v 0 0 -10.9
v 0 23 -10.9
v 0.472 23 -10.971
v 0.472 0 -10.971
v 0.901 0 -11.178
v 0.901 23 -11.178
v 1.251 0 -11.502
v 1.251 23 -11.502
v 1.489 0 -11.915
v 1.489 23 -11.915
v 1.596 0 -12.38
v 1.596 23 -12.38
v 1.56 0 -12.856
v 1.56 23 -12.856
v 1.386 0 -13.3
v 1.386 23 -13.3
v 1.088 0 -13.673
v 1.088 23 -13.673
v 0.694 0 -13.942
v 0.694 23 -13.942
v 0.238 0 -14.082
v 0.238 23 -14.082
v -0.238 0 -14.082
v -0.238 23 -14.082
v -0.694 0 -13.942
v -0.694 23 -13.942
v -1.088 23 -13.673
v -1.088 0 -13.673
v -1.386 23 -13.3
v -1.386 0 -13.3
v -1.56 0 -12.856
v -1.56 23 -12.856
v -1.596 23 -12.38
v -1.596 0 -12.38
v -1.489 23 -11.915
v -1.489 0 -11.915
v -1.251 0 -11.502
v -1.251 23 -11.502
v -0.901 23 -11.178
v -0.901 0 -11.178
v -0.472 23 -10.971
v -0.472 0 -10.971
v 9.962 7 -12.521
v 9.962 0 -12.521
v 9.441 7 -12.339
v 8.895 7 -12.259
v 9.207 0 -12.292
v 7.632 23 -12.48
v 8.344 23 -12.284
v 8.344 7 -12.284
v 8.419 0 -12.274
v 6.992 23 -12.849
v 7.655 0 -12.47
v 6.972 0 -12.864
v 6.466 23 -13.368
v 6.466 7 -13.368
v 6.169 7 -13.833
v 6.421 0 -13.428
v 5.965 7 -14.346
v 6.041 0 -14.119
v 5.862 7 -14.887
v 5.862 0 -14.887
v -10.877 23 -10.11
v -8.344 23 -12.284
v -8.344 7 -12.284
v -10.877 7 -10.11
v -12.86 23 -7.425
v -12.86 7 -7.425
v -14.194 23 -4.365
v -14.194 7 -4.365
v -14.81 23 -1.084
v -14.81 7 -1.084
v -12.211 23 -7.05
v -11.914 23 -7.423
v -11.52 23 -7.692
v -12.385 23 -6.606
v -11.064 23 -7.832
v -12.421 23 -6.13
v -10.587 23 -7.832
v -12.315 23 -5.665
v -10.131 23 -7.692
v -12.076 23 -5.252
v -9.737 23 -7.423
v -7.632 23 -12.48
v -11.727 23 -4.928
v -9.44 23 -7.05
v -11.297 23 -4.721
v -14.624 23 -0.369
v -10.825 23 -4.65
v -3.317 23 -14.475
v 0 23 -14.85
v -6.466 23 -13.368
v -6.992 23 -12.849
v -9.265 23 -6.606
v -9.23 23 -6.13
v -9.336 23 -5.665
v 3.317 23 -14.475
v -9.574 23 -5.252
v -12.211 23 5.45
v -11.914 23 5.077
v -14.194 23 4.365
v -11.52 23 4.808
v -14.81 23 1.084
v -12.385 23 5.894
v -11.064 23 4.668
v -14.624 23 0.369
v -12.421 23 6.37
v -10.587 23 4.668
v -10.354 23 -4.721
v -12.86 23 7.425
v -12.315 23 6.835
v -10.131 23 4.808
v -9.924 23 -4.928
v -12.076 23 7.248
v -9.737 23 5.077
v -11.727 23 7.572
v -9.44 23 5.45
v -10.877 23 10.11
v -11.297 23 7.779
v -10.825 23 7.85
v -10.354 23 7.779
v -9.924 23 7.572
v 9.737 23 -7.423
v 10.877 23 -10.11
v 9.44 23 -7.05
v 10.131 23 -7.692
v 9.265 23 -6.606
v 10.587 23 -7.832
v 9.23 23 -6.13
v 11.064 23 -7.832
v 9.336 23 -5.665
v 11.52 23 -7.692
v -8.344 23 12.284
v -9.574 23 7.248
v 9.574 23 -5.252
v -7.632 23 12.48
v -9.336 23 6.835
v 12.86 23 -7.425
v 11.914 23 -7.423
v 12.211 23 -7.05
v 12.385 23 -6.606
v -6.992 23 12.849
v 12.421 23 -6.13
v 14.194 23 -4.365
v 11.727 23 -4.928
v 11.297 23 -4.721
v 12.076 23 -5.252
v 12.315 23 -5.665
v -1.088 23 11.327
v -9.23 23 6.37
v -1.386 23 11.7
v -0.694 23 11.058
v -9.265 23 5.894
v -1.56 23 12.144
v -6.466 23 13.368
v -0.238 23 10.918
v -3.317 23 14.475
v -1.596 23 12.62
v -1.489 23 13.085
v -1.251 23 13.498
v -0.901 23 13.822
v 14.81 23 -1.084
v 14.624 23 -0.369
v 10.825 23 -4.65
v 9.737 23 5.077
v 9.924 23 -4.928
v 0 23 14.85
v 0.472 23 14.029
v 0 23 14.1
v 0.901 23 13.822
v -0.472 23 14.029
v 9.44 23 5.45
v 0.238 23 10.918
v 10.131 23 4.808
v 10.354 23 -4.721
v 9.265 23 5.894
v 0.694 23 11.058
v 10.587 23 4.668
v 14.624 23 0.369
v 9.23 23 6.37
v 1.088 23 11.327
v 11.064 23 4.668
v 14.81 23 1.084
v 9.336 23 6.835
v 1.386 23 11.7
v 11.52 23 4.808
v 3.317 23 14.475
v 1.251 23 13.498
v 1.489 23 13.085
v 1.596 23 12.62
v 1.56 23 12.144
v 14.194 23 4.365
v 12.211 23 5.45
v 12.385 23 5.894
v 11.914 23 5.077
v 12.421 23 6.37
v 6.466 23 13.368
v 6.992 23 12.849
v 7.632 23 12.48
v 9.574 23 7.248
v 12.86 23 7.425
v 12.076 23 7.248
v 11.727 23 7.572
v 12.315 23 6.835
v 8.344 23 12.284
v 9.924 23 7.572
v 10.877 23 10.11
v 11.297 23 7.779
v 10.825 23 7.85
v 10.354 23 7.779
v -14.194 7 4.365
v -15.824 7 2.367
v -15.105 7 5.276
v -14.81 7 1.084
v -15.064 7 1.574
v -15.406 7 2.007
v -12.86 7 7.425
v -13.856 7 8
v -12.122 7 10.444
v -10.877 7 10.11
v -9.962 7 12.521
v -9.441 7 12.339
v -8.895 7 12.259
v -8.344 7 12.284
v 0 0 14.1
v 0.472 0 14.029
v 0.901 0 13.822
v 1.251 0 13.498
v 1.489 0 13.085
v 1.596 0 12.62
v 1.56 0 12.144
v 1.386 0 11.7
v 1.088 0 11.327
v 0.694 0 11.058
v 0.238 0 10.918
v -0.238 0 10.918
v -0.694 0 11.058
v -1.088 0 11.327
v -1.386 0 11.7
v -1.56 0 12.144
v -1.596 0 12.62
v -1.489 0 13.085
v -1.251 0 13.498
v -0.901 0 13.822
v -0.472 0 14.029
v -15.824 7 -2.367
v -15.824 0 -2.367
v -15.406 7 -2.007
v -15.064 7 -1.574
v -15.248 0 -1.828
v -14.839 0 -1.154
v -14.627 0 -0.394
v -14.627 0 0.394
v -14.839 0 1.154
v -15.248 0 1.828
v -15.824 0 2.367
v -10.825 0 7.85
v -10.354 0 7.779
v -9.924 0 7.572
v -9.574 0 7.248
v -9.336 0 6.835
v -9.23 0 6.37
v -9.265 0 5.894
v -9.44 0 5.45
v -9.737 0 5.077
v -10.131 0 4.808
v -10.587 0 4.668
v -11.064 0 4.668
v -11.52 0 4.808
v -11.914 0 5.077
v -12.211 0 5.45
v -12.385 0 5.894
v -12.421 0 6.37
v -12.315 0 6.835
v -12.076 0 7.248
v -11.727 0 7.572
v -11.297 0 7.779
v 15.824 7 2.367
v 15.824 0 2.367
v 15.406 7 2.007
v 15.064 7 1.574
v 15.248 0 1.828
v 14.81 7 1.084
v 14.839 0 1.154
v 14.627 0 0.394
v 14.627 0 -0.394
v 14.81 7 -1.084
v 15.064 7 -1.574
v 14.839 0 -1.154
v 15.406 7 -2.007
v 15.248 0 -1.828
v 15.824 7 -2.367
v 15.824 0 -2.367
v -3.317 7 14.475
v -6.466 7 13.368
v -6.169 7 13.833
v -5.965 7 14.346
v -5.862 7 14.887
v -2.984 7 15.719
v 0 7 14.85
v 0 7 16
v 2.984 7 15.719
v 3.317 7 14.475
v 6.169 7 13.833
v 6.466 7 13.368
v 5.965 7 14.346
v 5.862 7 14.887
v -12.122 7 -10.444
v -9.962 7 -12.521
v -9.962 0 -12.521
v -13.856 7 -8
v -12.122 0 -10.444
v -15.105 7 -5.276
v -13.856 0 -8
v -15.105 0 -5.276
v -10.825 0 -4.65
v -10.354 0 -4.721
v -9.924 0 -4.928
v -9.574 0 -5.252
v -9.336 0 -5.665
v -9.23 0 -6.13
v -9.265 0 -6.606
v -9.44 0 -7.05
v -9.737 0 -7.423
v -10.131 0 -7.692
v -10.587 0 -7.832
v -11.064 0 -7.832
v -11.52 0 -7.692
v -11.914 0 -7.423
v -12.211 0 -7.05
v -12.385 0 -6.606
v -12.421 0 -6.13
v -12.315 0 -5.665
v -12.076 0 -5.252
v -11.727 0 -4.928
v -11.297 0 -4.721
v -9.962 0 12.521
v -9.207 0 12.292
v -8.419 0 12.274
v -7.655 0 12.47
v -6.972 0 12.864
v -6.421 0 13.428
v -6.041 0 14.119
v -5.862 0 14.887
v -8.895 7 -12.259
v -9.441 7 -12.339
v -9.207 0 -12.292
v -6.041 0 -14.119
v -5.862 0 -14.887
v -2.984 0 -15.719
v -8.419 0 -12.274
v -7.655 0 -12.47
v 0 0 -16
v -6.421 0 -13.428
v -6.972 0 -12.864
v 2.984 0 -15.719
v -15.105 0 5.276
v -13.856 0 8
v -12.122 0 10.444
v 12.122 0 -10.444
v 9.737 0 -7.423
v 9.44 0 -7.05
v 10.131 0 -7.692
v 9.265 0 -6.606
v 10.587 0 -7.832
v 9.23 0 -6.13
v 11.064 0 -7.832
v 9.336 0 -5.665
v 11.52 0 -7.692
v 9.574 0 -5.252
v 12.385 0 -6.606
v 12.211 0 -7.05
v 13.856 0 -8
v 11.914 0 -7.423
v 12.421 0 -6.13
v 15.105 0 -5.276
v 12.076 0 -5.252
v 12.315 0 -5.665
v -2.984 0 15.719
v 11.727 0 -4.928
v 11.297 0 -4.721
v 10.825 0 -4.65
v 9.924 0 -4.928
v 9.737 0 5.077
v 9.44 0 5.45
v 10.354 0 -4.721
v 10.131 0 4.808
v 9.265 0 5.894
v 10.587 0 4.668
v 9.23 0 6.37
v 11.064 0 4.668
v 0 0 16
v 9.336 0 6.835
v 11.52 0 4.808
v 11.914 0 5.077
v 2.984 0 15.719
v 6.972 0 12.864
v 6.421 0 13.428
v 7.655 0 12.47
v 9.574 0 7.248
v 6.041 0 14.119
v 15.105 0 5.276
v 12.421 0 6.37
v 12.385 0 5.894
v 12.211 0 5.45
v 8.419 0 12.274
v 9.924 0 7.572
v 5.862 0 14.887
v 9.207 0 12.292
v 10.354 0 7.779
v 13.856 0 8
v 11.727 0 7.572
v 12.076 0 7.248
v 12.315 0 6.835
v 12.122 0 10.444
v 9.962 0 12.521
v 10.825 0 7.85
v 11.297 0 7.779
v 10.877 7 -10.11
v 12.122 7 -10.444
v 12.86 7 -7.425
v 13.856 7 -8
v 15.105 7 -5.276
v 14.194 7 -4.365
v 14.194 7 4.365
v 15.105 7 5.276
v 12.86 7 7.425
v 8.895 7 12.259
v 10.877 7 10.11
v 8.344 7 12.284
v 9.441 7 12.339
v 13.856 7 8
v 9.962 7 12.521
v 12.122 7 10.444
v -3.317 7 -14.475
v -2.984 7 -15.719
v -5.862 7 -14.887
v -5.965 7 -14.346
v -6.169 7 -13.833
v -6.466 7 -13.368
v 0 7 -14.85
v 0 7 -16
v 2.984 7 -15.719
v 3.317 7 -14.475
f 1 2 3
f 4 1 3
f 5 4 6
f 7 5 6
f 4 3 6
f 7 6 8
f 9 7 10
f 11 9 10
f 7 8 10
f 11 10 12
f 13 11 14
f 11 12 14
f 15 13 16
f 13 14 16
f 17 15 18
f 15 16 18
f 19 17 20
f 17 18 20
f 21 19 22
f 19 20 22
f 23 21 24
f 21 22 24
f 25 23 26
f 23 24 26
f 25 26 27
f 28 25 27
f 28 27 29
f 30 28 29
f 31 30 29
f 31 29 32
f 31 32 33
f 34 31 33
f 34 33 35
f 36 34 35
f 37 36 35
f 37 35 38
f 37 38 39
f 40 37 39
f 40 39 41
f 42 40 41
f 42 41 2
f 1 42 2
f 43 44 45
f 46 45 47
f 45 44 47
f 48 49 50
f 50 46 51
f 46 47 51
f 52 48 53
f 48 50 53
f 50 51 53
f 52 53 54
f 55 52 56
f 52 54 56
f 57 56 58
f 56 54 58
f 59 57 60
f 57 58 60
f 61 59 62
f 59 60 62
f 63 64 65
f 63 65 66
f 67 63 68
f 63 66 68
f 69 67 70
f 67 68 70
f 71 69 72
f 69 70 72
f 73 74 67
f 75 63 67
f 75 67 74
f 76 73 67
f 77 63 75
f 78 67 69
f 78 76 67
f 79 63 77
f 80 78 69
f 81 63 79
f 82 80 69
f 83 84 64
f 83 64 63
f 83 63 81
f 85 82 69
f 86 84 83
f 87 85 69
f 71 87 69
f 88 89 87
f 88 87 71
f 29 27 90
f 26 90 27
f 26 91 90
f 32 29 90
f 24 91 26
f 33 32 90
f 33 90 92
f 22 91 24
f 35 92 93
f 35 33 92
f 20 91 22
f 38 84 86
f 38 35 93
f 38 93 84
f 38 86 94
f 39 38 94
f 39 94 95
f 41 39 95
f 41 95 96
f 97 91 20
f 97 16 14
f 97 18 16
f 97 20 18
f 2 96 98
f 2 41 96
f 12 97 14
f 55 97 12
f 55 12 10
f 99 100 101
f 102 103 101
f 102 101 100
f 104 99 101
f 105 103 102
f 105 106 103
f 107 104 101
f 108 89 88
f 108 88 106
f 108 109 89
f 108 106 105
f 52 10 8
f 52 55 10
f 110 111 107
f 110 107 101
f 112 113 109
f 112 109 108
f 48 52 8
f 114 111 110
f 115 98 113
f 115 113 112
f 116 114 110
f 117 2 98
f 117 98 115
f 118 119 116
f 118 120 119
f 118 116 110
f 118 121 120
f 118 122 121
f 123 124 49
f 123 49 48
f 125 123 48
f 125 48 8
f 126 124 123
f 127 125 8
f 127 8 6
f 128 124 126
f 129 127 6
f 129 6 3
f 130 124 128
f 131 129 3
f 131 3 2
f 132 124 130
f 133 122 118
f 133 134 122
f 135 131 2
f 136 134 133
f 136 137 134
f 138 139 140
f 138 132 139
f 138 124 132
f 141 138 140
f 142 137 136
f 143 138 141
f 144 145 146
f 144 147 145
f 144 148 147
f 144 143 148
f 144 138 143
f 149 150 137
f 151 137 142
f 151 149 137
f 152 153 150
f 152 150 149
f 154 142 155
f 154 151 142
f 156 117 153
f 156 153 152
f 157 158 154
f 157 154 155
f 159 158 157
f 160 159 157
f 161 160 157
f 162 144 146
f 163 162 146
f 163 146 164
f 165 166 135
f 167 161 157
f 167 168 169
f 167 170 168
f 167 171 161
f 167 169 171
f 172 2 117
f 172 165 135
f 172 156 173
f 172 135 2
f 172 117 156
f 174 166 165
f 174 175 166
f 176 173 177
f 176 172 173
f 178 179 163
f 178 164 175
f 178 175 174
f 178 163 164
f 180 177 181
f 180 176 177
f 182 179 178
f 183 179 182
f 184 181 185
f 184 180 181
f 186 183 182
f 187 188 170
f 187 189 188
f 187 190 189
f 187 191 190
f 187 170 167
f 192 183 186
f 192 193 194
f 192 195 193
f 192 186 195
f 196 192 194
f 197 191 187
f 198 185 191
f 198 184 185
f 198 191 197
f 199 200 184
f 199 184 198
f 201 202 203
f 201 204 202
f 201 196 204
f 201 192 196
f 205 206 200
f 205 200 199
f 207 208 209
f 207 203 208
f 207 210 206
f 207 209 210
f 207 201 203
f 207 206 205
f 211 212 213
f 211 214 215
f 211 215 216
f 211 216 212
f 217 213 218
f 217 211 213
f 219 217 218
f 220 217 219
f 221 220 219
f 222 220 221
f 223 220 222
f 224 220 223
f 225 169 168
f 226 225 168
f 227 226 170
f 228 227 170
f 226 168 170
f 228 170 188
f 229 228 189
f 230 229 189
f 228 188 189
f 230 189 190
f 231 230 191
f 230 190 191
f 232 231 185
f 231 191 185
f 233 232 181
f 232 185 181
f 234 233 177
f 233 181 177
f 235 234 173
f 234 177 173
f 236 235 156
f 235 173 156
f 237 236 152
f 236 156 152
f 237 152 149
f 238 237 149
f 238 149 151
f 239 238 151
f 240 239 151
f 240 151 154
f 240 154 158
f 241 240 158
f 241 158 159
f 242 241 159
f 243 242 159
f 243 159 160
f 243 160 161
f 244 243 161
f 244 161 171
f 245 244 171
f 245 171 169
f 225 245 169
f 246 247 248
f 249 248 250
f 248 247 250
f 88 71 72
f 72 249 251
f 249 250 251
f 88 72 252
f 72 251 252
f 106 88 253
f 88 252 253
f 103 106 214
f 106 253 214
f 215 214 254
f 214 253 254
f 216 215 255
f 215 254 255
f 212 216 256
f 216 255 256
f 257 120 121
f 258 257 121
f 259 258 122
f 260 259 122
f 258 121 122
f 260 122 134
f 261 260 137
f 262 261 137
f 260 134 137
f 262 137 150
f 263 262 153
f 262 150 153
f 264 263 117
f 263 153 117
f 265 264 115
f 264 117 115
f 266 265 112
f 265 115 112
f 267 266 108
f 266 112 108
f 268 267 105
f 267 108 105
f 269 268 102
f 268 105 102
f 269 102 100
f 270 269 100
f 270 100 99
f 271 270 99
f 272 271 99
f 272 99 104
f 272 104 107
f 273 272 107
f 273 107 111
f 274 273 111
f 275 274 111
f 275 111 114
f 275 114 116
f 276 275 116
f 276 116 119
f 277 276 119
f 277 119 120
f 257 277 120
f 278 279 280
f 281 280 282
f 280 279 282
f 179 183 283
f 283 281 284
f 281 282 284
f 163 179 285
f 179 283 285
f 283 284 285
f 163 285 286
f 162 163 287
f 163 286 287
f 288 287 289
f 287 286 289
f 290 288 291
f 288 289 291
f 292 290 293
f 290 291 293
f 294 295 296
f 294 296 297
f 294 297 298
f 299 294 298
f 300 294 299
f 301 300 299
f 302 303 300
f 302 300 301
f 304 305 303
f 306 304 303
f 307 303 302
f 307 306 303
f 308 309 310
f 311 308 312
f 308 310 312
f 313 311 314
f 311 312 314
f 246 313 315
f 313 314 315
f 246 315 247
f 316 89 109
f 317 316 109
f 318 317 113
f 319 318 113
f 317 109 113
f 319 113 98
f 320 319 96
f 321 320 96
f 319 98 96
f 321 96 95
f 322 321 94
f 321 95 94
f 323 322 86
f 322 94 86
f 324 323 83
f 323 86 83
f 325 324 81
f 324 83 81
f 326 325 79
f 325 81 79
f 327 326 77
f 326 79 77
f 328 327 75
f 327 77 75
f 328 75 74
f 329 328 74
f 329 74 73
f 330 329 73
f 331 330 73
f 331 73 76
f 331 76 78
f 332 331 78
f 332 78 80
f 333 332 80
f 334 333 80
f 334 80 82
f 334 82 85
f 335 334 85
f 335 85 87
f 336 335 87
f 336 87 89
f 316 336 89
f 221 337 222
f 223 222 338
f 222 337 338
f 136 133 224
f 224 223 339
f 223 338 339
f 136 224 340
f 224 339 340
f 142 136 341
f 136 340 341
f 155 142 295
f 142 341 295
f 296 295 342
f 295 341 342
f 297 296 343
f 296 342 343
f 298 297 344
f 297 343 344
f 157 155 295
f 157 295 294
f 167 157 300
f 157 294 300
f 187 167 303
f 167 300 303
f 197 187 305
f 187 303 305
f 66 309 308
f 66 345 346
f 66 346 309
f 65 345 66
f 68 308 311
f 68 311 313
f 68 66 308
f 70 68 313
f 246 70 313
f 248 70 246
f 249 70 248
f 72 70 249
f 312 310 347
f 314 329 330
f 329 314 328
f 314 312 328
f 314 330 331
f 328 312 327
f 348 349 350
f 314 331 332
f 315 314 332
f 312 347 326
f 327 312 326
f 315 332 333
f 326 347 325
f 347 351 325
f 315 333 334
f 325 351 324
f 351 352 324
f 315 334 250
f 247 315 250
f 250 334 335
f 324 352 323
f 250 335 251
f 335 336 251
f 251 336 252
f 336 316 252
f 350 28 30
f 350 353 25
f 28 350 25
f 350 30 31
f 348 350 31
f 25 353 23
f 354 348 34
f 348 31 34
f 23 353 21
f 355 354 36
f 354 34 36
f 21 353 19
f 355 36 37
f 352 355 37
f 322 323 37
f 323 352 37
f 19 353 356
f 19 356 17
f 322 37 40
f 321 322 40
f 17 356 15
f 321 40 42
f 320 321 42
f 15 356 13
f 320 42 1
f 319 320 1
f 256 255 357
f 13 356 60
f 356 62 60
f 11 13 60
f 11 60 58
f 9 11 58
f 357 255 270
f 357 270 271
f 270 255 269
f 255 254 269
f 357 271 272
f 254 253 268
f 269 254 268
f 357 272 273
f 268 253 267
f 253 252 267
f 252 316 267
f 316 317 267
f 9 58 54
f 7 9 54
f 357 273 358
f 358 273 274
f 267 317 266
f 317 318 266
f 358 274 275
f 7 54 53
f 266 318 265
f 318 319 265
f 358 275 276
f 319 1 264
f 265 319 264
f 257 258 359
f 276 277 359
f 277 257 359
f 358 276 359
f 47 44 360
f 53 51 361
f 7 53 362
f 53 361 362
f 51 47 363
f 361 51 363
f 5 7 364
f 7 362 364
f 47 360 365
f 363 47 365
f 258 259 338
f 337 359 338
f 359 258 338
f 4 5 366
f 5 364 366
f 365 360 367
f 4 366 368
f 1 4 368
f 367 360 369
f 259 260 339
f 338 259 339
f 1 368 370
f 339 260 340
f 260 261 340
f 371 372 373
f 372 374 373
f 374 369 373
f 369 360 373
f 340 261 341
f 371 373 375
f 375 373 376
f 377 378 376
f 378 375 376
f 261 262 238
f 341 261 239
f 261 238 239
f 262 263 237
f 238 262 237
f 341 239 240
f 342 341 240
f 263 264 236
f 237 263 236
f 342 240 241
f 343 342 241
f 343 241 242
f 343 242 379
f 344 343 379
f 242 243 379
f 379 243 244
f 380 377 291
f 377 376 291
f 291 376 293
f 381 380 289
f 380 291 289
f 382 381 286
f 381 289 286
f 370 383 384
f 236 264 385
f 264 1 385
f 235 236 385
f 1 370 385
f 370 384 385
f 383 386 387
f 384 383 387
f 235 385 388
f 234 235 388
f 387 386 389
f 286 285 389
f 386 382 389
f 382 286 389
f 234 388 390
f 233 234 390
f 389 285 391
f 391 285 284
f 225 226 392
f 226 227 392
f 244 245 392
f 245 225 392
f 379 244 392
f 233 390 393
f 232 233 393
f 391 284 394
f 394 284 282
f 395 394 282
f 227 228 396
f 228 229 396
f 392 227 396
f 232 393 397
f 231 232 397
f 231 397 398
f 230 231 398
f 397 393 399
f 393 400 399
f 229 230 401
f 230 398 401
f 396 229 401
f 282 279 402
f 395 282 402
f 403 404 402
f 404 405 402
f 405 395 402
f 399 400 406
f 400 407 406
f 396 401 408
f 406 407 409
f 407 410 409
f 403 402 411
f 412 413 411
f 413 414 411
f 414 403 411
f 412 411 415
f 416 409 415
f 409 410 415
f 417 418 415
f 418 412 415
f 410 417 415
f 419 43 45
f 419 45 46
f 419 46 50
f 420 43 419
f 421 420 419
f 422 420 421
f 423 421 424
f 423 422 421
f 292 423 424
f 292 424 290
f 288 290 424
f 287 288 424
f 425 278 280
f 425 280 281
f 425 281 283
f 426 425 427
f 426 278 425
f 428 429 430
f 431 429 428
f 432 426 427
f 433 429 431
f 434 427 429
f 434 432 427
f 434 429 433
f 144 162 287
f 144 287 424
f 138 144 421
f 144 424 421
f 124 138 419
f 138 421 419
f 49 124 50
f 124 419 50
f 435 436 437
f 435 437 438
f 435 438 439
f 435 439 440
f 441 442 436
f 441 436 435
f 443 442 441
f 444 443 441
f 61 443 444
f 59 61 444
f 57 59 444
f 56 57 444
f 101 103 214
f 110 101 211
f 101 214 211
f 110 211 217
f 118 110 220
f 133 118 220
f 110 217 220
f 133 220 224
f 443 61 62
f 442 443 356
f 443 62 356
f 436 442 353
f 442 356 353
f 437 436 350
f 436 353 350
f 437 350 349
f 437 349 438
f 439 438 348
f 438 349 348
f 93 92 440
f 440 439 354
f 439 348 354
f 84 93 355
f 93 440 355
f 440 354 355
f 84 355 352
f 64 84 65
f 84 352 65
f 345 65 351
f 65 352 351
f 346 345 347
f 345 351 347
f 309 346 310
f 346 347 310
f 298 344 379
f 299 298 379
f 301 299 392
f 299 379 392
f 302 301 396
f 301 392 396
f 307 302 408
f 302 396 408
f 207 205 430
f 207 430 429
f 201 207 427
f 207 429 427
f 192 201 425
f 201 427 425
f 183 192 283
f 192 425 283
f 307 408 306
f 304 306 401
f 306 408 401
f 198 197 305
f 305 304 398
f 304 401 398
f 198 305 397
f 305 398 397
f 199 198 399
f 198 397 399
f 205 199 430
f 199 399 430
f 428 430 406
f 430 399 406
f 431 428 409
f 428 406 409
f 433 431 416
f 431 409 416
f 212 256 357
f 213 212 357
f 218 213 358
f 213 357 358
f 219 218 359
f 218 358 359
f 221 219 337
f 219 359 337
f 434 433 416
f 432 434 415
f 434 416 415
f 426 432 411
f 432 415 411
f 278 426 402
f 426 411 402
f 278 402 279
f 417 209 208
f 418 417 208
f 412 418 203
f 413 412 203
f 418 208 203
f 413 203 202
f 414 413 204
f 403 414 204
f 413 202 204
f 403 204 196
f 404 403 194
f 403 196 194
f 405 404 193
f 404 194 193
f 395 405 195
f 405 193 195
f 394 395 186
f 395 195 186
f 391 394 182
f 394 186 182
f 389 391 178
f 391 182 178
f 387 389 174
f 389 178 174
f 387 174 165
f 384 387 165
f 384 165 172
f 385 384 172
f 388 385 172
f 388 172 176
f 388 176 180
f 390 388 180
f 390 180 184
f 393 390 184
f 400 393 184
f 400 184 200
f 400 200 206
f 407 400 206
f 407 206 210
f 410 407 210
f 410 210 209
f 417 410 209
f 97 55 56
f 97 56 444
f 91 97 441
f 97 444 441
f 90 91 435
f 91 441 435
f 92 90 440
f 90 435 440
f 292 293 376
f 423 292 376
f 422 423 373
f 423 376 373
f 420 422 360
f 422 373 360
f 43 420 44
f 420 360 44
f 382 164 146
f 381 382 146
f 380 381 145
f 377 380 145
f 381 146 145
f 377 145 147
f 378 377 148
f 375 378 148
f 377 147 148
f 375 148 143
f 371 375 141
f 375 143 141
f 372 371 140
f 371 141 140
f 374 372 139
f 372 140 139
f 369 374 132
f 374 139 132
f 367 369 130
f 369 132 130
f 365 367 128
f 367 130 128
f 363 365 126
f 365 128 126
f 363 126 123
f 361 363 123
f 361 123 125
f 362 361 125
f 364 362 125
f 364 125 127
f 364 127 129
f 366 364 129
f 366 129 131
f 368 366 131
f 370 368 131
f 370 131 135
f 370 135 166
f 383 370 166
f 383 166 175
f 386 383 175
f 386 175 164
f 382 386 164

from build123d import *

# Parameters (mm, degrees)
SKETCH_1_R          = 16
EXTRUDE_1_DEPTH     = 7
SKETCH_2_R          = 14.85
EXTRUDE_2_DEPTH     = 16
SKETCH_3_R          = 1.6
CUT_EXTRUDE_1_DEPTH = 33.26453161
SKETCH_4_R          = 2.9
CUT_EXTRUDE_2_DEPTH = 33.26453161


with BuildPart() as part:
    # 草图1 → 凸台-拉伸1 (new body)
    with BuildSketch(Plane(origin=(0, 0, 0), x_dir=(1, 0, 0), z_dir=(0, 1, 0))):
        with Locations(Location((0, 0, 0), (0, 0, 270))):
            Circle(SKETCH_1_R)
    extrude(amount=EXTRUDE_1_DEPTH)

    # 草图2 → 凸台-拉伸2 (add)
    with BuildSketch(Plane(origin=(0, 7, 0), x_dir=(1, 0, 0), z_dir=(0, 1, 0))):
        with Locations(Location((0, 0, 0), (0, 0, 270))):
            Circle(SKETCH_2_R)
    extrude(amount=EXTRUDE_2_DEPTH)

    # 草图3 → 切除-拉伸1 (cut, through all)
    with BuildSketch(Plane(origin=(0, 23, 0), x_dir=(1, 0, 0), z_dir=(0, 1, 0))):
        with Locations(Location((0, 12.5, 0), (0, 0, 270))):
            Circle(SKETCH_3_R)
        with Locations(Location((10.825317547, 6.25, 0), (0, 0, 270))):
            Circle(SKETCH_3_R)
        with Locations(Location((10.825317547, -6.25, 0), (0, 0, 270))):
            Circle(SKETCH_3_R)
        with Locations(Location((0, -12.5, 0), (0, 0, 270))):
            Circle(SKETCH_3_R)
        with Locations(Location((-10.825317547, -6.25, 0), (0, 0, 270))):
            Circle(SKETCH_3_R)
        with Locations(Location((-10.825317547, 6.25, 0), (0, 0, 270))):
            Circle(SKETCH_3_R)
    extrude(amount=-CUT_EXTRUDE_1_DEPTH, mode=Mode.SUBTRACT)

    # 草图4 → 切除-拉伸2 (cut, through all)
    with BuildSketch(Plane.XZ):
        with Locations((8.75, 15.155444566)):
            Circle(SKETCH_4_R)
        with Locations((17.5, 0)):
            Circle(SKETCH_4_R)
        with Locations((8.75, -15.155444566)):
            Circle(SKETCH_4_R)
        with Locations((-8.75, -15.155444566)):
            Circle(SKETCH_4_R)
        with Locations((-17.5, 0)):
            Circle(SKETCH_4_R)
        with Locations((-8.75, 15.155444566)):
            Circle(SKETCH_4_R)
    extrude(amount=-CUT_EXTRUDE_2_DEPTH, mode=Mode.SUBTRACT)


solid = part.part
